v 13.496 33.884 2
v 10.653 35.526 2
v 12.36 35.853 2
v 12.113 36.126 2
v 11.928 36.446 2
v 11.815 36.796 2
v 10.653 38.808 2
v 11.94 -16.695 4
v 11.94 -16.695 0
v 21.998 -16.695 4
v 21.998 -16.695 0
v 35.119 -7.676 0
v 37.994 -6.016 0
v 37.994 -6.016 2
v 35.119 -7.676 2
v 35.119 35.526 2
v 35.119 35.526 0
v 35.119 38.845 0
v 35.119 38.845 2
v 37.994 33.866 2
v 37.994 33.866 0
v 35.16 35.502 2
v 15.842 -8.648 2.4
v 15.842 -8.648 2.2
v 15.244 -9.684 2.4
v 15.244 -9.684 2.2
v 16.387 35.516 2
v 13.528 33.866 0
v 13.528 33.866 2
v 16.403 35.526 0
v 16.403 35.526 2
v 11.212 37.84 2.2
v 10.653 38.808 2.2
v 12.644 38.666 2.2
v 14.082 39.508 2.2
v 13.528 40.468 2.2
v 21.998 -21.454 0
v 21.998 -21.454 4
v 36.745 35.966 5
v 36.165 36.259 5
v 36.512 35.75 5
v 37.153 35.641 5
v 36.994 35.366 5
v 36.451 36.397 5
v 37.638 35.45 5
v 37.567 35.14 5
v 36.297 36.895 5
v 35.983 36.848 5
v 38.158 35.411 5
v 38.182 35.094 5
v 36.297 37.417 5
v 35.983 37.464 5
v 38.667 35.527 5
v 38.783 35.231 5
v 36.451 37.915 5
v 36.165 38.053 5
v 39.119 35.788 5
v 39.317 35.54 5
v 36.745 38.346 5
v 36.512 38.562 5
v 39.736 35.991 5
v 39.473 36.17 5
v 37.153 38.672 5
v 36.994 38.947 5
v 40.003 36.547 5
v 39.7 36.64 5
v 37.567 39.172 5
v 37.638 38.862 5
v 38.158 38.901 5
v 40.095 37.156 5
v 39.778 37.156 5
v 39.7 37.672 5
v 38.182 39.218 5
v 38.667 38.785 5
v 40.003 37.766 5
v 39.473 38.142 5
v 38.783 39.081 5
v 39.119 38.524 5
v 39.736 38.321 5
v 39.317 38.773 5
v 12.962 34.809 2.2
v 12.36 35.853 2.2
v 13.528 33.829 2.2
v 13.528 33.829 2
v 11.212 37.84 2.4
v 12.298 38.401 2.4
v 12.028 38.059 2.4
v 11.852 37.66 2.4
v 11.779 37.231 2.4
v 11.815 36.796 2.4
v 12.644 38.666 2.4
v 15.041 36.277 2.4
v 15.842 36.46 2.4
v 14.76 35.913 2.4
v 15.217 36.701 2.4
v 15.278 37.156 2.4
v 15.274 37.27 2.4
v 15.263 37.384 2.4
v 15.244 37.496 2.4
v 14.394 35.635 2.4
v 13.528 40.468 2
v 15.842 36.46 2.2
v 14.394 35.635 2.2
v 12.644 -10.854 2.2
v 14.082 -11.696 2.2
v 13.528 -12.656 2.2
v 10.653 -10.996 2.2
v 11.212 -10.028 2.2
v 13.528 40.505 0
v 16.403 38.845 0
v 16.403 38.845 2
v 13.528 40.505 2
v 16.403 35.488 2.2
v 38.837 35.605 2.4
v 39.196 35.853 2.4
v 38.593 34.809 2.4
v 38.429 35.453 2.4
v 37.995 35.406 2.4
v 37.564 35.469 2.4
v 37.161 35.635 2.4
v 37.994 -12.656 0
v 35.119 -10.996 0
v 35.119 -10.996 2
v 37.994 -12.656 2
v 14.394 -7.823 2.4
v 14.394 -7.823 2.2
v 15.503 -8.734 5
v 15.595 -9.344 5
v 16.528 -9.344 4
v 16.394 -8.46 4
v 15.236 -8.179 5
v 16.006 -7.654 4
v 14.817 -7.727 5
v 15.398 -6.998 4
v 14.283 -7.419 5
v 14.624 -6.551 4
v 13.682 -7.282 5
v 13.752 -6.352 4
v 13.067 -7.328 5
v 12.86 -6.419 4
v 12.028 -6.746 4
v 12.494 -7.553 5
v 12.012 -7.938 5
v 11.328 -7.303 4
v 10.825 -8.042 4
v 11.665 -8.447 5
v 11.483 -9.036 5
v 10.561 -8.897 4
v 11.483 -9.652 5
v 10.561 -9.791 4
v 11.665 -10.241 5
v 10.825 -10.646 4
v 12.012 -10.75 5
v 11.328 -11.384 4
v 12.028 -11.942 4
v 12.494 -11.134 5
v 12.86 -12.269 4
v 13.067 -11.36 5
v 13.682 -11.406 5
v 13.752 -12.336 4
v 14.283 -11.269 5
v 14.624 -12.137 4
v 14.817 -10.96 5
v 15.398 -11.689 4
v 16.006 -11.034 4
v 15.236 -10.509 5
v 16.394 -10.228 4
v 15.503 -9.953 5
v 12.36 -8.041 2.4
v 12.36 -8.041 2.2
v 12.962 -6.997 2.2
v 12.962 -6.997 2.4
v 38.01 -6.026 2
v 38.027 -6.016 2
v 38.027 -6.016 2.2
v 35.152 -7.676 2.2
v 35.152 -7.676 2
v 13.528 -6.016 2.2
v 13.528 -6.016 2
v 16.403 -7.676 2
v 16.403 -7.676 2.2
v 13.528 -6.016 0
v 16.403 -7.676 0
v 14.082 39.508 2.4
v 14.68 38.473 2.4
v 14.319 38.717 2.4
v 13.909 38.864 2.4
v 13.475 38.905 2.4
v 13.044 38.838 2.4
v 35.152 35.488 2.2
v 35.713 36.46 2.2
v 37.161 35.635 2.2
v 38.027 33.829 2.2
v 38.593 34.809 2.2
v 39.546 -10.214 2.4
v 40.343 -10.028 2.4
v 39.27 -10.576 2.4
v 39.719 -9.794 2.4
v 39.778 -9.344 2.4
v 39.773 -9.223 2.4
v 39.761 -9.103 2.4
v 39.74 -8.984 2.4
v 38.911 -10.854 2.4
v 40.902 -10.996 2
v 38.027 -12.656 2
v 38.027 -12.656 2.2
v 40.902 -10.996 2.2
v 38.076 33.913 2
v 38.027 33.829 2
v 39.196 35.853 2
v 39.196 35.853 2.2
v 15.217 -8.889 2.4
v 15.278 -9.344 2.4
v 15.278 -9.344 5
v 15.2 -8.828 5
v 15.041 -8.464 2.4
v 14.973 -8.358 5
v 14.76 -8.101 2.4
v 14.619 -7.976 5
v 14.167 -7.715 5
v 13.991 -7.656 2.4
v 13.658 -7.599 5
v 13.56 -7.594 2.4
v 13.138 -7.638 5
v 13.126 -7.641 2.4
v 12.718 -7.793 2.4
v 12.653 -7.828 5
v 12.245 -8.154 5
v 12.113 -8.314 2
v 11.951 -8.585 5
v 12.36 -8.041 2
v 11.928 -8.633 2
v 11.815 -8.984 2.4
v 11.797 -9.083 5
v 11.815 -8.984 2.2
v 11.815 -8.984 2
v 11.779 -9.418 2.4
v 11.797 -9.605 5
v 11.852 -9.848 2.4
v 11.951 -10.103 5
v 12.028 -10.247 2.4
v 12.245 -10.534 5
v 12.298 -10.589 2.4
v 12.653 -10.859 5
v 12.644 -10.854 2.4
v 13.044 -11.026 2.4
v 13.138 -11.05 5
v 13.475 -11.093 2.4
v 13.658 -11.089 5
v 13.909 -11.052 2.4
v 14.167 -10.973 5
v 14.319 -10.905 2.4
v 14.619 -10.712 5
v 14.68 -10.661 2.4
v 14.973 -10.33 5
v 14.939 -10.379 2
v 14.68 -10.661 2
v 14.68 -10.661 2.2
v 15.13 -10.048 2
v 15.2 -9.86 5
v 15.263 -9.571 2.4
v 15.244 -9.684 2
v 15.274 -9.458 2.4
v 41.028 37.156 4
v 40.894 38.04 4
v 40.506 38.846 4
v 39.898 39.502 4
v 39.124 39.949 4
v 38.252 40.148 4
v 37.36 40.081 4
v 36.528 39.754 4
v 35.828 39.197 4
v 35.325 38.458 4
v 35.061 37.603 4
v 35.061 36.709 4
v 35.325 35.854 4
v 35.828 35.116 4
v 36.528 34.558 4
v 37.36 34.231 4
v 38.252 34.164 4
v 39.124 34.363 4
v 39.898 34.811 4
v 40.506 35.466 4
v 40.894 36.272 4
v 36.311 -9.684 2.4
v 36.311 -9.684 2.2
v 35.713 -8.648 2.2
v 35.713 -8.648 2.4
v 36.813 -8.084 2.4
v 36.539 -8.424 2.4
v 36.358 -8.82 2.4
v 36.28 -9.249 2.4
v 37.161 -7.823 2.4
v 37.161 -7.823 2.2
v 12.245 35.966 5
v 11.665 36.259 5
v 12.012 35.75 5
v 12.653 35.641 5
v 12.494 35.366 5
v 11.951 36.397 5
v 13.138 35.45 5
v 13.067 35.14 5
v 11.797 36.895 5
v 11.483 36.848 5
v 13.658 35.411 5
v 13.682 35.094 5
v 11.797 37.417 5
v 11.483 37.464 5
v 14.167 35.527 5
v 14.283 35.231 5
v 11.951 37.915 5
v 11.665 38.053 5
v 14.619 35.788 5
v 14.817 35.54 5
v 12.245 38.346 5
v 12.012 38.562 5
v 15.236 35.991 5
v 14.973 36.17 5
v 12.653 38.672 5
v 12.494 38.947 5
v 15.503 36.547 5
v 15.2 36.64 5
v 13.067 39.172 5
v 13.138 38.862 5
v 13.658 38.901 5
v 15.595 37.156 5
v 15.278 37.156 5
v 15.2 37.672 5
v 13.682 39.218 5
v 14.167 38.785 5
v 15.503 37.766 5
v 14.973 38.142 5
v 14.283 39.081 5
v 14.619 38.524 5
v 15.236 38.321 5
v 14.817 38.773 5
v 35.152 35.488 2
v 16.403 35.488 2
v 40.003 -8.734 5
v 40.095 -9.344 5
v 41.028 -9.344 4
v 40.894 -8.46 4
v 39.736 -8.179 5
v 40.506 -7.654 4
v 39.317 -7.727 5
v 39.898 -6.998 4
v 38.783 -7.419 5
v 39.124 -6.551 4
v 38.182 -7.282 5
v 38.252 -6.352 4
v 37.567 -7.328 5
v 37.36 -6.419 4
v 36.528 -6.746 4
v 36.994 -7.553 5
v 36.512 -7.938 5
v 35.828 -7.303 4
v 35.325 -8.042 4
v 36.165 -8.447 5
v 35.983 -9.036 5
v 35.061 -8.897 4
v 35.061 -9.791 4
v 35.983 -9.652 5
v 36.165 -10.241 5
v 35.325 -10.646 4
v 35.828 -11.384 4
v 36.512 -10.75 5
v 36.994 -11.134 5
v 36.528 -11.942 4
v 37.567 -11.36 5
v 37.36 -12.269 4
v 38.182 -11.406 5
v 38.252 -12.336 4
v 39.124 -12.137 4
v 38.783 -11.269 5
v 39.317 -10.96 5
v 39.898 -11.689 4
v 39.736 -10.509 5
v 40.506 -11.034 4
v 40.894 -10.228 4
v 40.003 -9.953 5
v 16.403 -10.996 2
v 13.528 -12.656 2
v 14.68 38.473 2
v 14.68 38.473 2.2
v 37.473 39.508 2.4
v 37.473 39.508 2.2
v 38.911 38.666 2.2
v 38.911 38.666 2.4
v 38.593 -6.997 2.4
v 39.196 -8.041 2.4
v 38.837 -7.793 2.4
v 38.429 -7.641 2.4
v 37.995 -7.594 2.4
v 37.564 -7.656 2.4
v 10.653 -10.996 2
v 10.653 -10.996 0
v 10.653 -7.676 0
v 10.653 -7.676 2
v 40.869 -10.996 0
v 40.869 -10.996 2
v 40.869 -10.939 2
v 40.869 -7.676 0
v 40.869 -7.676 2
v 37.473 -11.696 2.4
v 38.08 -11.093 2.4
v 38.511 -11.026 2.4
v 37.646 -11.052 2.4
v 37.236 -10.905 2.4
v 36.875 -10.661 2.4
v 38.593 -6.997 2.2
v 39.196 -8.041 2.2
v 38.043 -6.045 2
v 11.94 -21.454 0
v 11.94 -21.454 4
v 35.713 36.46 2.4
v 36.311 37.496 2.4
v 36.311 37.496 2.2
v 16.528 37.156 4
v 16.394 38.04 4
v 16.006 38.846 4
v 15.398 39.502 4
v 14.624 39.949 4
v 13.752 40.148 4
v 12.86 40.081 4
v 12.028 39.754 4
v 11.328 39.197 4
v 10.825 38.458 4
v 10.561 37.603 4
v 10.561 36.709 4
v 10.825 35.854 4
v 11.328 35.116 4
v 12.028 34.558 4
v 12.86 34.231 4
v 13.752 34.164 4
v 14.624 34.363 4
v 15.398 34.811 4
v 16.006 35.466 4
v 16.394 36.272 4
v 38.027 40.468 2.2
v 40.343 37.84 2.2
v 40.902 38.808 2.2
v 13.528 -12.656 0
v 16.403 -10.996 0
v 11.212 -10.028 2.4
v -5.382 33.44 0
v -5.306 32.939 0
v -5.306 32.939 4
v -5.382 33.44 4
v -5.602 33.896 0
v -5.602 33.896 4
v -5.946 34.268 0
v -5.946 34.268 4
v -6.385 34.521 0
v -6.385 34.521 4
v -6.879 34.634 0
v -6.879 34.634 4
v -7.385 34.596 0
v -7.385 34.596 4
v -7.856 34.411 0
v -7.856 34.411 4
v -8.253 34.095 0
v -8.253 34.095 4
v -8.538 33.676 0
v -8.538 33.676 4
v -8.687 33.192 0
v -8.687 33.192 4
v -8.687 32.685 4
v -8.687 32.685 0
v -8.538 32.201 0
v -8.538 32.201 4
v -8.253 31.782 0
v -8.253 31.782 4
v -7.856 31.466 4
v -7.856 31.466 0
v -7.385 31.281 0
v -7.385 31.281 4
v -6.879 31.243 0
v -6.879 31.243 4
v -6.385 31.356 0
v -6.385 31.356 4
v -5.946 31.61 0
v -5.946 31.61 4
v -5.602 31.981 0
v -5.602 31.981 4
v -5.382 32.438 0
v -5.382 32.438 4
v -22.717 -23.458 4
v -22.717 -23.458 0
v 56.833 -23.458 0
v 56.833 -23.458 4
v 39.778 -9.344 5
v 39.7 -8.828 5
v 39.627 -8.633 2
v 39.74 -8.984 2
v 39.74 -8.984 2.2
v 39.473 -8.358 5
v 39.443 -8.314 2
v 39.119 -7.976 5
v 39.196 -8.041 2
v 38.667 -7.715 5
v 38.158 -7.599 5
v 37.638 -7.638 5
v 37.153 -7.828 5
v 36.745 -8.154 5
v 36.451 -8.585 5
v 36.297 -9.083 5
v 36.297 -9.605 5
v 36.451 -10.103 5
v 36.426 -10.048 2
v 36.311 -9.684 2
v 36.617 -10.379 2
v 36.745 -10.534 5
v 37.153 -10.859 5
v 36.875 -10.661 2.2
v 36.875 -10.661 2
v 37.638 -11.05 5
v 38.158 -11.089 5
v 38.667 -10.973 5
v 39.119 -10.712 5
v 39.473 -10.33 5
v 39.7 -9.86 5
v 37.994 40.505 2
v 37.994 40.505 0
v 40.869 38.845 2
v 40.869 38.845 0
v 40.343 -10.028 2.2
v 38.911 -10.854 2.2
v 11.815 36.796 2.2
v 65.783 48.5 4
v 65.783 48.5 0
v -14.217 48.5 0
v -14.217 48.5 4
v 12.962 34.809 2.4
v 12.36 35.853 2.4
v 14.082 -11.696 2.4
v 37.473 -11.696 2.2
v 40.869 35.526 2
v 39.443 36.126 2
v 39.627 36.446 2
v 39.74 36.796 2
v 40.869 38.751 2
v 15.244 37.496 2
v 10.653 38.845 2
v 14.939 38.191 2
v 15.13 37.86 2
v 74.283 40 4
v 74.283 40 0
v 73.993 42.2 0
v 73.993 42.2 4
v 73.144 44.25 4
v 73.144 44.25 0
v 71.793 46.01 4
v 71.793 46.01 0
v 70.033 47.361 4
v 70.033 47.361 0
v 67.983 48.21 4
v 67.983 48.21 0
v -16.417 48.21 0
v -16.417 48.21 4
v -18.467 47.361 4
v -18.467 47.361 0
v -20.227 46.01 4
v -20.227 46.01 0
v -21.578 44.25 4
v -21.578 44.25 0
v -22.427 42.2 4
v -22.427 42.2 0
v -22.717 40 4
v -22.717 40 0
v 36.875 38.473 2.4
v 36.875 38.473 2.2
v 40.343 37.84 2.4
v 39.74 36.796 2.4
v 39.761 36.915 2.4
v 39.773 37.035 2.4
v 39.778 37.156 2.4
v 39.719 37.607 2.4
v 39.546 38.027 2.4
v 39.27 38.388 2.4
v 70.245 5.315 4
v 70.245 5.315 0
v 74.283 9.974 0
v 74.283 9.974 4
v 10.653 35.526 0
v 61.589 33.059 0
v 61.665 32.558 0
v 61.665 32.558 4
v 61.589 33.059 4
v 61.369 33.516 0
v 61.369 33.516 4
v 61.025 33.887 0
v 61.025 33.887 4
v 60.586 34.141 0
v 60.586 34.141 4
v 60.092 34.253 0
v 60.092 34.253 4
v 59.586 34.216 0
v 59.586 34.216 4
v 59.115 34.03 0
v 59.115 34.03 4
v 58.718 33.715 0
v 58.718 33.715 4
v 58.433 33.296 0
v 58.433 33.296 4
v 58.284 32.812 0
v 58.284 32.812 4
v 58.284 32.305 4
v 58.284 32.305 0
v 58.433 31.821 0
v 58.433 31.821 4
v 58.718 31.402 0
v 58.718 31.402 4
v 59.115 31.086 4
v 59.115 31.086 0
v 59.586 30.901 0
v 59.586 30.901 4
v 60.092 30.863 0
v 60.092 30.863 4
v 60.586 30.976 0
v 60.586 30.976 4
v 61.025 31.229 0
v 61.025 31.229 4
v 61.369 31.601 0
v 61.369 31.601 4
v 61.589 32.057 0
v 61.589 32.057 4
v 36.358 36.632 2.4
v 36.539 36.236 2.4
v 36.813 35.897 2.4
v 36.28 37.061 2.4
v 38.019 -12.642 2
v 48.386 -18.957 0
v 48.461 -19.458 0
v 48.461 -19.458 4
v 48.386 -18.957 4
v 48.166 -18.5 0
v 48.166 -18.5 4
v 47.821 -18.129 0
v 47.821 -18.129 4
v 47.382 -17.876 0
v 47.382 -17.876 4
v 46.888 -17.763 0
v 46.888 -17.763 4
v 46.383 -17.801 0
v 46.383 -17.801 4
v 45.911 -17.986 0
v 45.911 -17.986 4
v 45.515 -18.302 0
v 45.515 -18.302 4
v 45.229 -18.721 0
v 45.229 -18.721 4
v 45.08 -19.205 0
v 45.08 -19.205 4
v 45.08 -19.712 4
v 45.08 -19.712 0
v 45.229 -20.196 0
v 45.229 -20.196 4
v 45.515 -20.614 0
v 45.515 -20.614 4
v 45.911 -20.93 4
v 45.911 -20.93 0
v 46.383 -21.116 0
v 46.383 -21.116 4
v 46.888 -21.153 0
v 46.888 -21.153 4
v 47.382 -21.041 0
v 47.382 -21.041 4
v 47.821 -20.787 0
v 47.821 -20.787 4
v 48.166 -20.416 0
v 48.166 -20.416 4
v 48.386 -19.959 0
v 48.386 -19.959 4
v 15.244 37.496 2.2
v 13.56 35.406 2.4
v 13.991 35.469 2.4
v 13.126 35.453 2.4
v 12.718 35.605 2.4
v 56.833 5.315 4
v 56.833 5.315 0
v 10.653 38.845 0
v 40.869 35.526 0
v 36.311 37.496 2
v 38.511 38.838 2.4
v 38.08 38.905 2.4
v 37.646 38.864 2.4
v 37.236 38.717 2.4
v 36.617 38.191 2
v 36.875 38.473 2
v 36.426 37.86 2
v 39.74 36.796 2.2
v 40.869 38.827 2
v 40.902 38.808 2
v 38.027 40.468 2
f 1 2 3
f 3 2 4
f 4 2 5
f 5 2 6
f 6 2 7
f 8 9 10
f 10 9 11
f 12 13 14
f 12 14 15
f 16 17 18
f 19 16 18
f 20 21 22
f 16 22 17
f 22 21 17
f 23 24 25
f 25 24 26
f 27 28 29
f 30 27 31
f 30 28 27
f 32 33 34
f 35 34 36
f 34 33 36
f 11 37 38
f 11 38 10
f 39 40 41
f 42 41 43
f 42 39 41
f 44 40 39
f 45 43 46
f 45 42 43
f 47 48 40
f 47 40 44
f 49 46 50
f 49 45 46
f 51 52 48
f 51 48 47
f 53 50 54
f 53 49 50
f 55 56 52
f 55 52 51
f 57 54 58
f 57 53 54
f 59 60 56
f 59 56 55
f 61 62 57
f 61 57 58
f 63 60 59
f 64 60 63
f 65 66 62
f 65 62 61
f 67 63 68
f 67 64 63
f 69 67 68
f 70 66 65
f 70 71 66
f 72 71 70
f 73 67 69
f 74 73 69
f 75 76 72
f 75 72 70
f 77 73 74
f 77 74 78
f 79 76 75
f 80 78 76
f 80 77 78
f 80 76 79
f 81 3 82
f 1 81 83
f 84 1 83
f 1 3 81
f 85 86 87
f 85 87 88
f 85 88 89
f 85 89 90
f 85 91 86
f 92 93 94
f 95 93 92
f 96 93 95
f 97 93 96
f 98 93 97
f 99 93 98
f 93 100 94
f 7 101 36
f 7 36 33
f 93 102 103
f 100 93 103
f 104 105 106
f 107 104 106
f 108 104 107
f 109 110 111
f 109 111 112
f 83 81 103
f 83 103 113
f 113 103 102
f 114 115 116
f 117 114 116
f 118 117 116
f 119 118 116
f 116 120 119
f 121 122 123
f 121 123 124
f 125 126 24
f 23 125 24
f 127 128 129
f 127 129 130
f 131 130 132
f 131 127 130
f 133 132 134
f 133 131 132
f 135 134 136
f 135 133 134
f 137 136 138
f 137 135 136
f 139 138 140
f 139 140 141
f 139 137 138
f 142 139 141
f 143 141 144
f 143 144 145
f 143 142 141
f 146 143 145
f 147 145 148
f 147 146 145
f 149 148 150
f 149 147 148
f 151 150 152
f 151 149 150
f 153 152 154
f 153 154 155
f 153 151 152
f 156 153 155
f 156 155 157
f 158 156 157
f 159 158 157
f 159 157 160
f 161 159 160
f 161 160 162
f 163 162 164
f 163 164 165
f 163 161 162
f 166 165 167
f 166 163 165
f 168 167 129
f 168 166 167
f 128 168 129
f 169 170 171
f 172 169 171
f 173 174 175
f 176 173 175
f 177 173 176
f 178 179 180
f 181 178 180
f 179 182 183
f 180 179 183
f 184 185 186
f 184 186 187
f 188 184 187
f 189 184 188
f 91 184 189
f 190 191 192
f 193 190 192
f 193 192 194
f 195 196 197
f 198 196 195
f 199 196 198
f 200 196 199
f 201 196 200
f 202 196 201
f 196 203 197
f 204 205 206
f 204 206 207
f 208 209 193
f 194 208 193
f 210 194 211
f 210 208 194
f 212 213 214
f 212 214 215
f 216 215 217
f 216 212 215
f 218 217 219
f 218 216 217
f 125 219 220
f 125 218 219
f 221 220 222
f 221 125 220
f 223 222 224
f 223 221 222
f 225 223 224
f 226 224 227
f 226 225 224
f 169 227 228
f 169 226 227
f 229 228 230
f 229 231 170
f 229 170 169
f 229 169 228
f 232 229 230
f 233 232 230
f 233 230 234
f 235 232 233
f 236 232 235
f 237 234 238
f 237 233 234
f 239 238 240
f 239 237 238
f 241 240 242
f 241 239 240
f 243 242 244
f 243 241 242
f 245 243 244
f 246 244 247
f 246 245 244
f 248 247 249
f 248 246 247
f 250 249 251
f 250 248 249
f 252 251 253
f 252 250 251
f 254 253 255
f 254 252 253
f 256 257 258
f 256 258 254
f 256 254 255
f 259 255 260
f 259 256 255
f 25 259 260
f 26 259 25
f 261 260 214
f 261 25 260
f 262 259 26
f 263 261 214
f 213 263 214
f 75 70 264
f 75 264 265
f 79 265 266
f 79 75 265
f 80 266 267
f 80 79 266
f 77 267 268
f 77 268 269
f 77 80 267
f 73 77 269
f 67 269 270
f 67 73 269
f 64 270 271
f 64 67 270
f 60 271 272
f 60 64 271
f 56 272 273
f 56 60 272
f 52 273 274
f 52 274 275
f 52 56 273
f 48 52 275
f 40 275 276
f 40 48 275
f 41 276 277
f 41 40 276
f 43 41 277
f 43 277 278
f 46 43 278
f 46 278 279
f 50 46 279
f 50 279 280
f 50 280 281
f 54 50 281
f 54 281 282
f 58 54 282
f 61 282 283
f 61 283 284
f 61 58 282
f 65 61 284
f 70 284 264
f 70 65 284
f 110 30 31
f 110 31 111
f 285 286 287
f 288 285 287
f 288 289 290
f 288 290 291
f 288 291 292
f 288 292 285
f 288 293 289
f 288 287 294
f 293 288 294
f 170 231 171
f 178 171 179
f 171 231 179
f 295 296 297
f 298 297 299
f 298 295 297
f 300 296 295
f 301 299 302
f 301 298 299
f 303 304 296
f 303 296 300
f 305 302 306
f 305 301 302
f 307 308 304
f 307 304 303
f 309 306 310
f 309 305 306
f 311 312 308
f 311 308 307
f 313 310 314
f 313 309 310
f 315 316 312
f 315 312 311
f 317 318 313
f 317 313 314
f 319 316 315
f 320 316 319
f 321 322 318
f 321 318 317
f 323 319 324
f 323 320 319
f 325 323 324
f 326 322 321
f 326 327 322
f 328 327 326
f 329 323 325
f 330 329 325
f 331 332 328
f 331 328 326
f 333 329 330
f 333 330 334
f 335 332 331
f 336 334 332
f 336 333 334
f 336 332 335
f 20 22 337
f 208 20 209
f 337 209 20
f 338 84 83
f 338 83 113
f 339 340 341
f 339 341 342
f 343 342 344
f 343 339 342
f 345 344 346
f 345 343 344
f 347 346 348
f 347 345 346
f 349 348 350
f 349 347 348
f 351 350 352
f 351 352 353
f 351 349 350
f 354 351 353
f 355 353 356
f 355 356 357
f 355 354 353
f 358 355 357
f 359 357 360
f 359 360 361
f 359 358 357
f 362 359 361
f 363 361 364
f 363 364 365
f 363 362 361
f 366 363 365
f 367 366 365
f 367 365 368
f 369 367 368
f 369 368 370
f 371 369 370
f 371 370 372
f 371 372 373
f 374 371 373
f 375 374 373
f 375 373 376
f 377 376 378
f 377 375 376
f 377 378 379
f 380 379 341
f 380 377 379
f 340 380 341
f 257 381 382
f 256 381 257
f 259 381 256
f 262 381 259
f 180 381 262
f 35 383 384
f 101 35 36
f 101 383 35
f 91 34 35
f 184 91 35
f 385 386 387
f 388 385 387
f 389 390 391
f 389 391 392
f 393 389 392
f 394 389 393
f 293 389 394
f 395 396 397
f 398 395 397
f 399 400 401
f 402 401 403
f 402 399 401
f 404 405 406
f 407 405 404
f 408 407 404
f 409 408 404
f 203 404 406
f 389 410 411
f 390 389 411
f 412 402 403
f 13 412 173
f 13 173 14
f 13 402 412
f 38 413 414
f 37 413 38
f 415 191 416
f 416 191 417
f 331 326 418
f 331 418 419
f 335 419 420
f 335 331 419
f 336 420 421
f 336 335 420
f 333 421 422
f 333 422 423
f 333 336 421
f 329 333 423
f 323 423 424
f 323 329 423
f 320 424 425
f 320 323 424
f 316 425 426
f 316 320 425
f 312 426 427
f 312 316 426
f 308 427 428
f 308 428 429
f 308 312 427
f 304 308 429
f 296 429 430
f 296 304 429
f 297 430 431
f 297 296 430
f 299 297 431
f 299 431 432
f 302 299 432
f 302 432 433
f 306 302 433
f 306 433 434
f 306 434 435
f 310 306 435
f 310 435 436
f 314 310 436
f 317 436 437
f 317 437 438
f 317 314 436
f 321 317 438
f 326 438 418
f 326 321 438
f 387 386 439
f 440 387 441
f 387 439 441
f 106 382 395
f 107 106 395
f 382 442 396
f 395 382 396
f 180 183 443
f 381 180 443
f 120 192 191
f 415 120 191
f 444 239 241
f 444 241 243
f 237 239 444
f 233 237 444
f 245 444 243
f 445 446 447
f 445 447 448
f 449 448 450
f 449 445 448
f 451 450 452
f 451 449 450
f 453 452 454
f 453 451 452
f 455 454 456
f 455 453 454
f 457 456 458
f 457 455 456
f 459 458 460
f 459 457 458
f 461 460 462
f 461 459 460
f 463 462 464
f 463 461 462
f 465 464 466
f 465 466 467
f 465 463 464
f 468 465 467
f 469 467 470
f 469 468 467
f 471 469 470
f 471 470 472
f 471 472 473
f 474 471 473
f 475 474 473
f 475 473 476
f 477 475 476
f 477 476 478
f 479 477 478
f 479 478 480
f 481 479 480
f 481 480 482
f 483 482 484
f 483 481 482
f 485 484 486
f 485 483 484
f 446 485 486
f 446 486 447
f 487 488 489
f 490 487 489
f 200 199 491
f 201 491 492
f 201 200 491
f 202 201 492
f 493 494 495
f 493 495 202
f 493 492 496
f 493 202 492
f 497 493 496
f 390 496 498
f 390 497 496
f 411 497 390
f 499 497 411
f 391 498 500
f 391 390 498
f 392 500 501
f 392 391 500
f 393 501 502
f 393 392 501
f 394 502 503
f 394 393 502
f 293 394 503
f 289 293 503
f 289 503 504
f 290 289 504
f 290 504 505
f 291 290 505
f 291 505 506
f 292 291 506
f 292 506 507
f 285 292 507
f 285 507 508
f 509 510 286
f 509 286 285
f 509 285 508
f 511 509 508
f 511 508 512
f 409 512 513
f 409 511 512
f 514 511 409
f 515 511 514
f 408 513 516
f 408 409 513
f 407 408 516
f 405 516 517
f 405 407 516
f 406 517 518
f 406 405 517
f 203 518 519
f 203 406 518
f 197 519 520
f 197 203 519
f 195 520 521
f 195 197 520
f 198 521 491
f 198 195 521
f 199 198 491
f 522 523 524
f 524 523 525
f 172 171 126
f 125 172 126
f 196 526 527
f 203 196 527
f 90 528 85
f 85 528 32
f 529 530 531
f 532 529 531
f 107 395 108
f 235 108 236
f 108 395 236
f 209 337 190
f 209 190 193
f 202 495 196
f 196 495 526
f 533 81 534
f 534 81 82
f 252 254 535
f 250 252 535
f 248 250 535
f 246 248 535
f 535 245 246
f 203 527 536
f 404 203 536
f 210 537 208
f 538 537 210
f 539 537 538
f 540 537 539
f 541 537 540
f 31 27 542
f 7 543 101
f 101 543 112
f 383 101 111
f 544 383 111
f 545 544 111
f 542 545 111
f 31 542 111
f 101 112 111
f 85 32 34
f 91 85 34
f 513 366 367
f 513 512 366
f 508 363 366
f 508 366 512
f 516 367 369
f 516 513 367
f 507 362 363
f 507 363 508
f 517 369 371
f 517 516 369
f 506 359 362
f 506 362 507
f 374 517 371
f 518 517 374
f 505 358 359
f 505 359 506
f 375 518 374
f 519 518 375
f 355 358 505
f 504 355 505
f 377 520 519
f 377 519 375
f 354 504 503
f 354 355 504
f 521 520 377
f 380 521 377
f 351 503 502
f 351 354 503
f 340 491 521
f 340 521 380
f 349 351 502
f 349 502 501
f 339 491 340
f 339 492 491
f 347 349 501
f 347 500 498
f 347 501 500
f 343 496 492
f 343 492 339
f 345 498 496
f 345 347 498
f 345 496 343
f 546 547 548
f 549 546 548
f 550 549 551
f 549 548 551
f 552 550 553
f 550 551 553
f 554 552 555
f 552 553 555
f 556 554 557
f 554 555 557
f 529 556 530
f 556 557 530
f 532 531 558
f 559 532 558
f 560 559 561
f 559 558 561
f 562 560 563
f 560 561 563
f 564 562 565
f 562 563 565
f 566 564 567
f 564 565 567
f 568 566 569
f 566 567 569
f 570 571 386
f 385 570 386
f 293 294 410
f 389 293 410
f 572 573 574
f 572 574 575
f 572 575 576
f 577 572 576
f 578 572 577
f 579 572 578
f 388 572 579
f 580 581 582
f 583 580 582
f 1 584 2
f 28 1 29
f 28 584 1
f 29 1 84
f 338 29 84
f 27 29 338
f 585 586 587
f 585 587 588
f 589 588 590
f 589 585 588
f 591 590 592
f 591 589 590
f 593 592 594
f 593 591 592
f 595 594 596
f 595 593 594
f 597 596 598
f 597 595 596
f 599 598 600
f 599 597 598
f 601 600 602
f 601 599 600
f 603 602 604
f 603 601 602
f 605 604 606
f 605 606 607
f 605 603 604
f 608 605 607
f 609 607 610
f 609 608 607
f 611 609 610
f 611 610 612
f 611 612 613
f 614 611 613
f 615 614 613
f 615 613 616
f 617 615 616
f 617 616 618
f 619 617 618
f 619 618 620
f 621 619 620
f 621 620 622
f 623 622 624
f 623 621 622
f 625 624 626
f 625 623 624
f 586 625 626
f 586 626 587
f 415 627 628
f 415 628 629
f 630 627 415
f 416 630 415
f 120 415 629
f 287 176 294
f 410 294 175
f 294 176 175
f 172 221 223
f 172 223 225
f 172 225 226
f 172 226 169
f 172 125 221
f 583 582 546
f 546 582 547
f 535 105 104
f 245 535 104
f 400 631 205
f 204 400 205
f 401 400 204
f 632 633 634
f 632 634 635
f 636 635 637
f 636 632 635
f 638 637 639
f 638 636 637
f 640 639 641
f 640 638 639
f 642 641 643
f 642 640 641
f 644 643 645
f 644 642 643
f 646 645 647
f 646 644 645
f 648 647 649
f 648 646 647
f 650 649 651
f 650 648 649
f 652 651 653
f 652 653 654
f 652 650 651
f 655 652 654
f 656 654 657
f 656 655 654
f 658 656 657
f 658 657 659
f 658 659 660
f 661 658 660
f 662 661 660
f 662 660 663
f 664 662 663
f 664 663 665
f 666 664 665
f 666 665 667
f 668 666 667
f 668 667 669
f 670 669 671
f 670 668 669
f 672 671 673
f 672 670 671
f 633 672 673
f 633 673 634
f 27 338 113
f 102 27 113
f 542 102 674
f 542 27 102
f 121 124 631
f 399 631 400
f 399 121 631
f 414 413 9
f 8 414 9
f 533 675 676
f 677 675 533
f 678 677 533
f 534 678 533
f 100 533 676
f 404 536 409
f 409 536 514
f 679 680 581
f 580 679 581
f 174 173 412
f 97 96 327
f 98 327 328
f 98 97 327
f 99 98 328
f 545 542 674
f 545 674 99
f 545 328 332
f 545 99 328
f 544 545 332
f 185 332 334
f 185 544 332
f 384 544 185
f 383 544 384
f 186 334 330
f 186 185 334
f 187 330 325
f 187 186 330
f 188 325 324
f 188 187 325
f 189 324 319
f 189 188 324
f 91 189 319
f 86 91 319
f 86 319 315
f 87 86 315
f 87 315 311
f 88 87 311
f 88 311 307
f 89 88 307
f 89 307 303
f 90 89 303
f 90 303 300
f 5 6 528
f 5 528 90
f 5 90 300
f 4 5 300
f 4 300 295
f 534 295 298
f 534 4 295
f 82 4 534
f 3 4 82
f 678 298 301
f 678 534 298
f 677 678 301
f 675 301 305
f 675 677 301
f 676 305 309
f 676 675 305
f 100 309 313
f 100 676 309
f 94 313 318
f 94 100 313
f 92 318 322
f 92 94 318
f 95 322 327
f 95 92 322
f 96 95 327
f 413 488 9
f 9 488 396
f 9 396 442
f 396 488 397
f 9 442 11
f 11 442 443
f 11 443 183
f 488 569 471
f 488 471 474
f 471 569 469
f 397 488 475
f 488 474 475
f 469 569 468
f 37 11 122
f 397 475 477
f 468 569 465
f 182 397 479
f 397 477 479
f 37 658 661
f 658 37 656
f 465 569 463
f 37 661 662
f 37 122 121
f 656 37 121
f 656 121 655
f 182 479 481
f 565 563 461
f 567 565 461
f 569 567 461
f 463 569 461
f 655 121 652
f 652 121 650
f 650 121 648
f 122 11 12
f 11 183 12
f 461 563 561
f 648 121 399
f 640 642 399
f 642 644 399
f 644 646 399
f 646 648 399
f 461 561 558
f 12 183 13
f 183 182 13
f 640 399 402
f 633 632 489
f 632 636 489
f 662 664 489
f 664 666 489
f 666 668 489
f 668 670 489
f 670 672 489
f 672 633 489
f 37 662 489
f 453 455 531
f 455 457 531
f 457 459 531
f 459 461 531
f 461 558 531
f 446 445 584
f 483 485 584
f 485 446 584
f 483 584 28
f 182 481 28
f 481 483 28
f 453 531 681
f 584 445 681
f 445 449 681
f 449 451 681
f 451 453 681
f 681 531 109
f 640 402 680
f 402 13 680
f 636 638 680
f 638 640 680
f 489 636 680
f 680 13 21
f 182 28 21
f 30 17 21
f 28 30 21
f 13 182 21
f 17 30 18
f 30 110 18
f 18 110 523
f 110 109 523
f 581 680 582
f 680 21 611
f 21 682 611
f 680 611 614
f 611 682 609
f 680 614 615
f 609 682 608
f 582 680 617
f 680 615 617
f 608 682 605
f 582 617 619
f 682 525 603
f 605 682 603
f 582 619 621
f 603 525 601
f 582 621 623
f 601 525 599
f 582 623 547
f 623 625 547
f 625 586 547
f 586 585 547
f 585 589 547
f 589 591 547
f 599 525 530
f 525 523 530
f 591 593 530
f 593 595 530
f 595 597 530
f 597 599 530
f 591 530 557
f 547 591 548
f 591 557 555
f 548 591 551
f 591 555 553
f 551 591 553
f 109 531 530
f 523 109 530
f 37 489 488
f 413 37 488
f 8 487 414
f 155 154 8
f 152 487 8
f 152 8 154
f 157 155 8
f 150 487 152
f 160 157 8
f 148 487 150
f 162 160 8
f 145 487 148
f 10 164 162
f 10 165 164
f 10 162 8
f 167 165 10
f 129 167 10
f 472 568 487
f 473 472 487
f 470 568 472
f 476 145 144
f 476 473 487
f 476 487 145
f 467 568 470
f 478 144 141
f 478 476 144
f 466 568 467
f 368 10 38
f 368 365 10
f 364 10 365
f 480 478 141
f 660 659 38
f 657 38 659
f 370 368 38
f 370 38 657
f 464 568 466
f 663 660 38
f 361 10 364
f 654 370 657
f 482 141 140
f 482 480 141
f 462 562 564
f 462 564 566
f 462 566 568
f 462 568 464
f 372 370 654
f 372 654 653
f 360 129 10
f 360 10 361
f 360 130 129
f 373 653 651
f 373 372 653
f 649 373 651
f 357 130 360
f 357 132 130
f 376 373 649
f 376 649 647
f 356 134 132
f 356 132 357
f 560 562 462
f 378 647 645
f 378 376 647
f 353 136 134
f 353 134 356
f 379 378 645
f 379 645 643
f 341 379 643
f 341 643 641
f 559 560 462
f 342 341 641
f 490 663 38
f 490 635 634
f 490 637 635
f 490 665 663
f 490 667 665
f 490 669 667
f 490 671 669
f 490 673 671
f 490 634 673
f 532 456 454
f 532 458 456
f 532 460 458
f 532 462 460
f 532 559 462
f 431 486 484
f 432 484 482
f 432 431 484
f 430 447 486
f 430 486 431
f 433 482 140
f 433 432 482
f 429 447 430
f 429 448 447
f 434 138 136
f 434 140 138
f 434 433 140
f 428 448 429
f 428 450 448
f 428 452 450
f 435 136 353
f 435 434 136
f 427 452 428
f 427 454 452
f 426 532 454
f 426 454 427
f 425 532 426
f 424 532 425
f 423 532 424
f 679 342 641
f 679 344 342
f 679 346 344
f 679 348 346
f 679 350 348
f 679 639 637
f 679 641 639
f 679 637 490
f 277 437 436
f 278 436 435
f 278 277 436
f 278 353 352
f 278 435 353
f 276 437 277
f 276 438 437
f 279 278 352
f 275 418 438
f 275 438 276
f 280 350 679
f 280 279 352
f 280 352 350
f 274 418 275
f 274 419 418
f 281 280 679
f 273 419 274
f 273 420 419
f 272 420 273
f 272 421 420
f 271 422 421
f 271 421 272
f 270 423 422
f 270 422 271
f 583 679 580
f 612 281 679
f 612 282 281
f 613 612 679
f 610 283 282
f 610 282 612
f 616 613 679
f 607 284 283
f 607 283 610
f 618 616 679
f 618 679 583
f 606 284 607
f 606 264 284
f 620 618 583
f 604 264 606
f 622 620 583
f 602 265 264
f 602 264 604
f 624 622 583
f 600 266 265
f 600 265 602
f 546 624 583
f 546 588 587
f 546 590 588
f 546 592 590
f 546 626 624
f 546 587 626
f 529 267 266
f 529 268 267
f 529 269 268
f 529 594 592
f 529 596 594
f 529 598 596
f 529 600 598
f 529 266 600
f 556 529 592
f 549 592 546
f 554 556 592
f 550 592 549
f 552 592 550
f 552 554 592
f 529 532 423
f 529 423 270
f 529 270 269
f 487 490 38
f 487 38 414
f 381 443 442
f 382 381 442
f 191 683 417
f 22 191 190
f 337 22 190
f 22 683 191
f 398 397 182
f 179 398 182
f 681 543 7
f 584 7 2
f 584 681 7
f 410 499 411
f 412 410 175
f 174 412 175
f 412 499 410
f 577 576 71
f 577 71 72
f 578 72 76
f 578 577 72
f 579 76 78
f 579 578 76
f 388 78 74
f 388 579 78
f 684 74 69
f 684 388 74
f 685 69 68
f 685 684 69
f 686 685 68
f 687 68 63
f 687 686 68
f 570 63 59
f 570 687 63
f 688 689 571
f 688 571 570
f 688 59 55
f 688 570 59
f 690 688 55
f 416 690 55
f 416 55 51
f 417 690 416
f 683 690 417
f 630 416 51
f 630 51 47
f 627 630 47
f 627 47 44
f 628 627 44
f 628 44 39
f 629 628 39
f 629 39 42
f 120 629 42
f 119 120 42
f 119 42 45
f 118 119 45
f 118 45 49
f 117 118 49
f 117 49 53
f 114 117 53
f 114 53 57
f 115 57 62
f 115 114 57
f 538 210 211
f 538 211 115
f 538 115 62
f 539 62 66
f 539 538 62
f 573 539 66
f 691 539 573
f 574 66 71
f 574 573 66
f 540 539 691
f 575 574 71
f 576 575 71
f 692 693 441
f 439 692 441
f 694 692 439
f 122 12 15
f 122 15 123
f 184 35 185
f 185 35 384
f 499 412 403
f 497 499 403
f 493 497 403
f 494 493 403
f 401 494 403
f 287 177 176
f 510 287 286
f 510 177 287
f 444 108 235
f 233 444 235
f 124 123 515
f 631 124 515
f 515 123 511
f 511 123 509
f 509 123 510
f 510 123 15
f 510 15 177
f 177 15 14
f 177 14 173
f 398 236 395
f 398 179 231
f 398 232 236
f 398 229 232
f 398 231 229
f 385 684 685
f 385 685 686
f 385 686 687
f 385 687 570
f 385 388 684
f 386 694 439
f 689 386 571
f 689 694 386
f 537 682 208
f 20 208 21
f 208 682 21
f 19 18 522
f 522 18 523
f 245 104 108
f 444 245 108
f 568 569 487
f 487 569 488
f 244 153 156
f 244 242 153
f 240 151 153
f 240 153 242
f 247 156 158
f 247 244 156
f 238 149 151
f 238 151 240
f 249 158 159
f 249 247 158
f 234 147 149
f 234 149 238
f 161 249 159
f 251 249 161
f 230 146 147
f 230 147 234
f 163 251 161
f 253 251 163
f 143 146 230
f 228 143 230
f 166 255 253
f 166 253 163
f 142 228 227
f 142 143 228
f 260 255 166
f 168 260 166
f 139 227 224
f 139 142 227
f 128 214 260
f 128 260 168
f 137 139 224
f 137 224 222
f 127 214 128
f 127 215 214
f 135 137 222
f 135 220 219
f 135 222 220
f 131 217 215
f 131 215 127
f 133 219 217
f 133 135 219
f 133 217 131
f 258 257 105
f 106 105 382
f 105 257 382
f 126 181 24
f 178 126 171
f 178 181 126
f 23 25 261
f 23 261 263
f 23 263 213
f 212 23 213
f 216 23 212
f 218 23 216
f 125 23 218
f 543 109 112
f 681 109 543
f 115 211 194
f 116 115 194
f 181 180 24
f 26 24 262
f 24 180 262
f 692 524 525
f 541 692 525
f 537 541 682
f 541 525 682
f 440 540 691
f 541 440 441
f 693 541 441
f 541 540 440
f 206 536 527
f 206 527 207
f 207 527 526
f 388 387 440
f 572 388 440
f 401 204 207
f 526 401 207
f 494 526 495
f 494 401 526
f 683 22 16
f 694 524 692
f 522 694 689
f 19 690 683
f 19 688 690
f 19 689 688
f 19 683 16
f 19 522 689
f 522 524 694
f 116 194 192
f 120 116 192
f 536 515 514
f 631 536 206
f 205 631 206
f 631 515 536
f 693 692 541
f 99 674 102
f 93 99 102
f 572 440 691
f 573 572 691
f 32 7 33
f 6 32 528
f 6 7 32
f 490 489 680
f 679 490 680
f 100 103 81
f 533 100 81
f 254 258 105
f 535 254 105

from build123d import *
from OCP.BRepFilletAPI import BRepFilletAPI_MakeChamfer

# Parameters (mm, degrees)
CROQUIS1_R              = 1.7
CROQUIS1_W              = 10.058265445
CROQUIS1_H              = 4.759112173
SALIENTE_EXTRUIR1_DEPTH = 4
CROQUIS2_R              = 3
CROQUIS2_R_2            = 1.75
SALIENTE_EXTRUIR2_DEPTH = 1
CHAFL_N1_SIZE           = 1
CHAFL_N1_SIZE_2         = 0.932515086
CORTAR_EXTRUIR1_START   = -6
CROQUIS3_R              = 1.75
CORTAR_EXTRUIR1_DEPTH   = 6
CORTAR_EXTRUIR2_DEPTH   = 2
CORTAR_EXTRUIR3_DEPTH   = 0.2
CORTAR_EXTRUIR4_DEPTH   = 0.2


with BuildPart() as part:
    # Croquis1 → Saliente-Extruir1 (new body)
    with BuildSketch(Plane.XY):
        with BuildLine():
            Line((46.761077919, -23.458131852), (56.832754836, -23.458131852))
            Line((56.832754836, -23.458131852), (56.832754836, 5.314653818))
            Line((56.832754836, 5.314653818), (70.245248308, 5.314653818))
            Line((70.245248308, 5.314653818), (74.283027827, 9.974351882))
            Line((74.283027827, 9.974351882), (74.283027827, 40))
            ThreePointArc((74.283027827, 40), (71.793435467, 46.01040764), (65.783027827, 48.5))
            Line((65.783027827, 48.5), (-14.216972173, 48.5))
            ThreePointArc((-14.216972173, 48.5), (-20.227379813, 46.01040764), (-22.716972173, 40))
            Line((-22.716972173, 40), (-22.716972173, -23.458131852))
            Line((-22.716972173, -23.458131852), (46.761077919, -23.458131852))
        make_face()
        with Locations((46.761077919, -19.458131852)):
            Circle(CROQUIS1_R, mode=Mode.SUBTRACT)
        with Locations((-7.00634082, 32.938725209)):
            Circle(CROQUIS1_R, mode=Mode.SUBTRACT)
        with Locations((59.964675143, 32.558212342)):
            Circle(CROQUIS1_R, mode=Mode.SUBTRACT)
        with Locations((16.969290087, -19.074136319)):
            Rectangle(CROQUIS1_W, CROQUIS1_H, mode=Mode.SUBTRACT)
    extrude(amount=SALIENTE_EXTRUIR1_DEPTH)

    # Croquis2 → Saliente-Extruir2 (add)
    # profile 1 of 4: a face of its own
    with BuildSketch(Plane.XY.offset(4)):
        with Locations((13.527577906, 37.15608476)):
            Circle(CROQUIS2_R)
        with Locations((13.527577906, 37.15608476)):
            Circle(CROQUIS2_R_2, mode=Mode.SUBTRACT)
    # profile 2 of 4: a face of its own
    with BuildSketch(Plane.XY.offset(4)):
        with Locations((38.027577906, 37.15608476)):
            Circle(CROQUIS2_R)
        with Locations((38.027577906, 37.15608476)):
            Circle(CROQUIS2_R_2, mode=Mode.SUBTRACT)
    # profile 3 of 4: a face of its own
    with BuildSketch(Plane.XY.offset(4)):
        with Locations((38.027577906, -9.34391524)):
            Circle(CROQUIS2_R)
        with Locations((38.027577906, -9.34391524)):
            Circle(CROQUIS2_R_2, mode=Mode.SUBTRACT)
    # profile 4 of 4: a face of its own
    with BuildSketch(Plane.XY.offset(4)):
        with Locations((13.527577906, -9.34391524)):
            Circle(CROQUIS2_R)
        with Locations((13.527577906, -9.34391524)):
            Circle(CROQUIS2_R_2, mode=Mode.SUBTRACT)
    extrude(amount=SALIENTE_EXTRUIR2_DEPTH)

    # Chaflán1
    chafl_n1_edges_1 = [part.edges().sort_by_distance(p)[0] for p in [
        (10.527577906, 37.15608476, 5),
    ]]
    chafl_n1_side_1 = [part.faces().sort_by_distance(p)[0] for p in [
        (10.527577906, 37.15608476, 4.981349698),
    ]]
    chafl_n1_edges_2 = [part.edges().sort_by_distance(p)[0] for p in [
        (35.027577906, 37.15608476, 5),
    ]]
    chafl_n1_side_2 = [part.faces().sort_by_distance(p)[0] for p in [
        (35.027577906, 37.15608476, 4.981349698),
    ]]
    chafl_n1_edges_3 = [part.edges().sort_by_distance(p)[0] for p in [
        (35.027577906, -9.34391524, 5),
    ]]
    chafl_n1_side_3 = [part.faces().sort_by_distance(p)[0] for p in [
        (35.027577906, -9.34391524, 4.981349698),
    ]]
    chafl_n1_edges_4 = [part.edges().sort_by_distance(p)[0] for p in [
        (10.527577906, -9.34391524, 5),
    ]]
    chafl_n1_side_4 = [part.faces().sort_by_distance(p)[0] for p in [
        (10.527577906, -9.34391524, 4.981349698),
    ]]
    chafl_n1 = BRepFilletAPI_MakeChamfer(part.part.solid().wrapped)
    for e in chafl_n1_edges_1:
        chafl_n1.Add(CHAFL_N1_SIZE - 0.0001, CHAFL_N1_SIZE_2 - 0.0001, e.wrapped, chafl_n1_side_1[0].wrapped)
    for e in chafl_n1_edges_2:
        chafl_n1.Add(CHAFL_N1_SIZE - 0.0001, CHAFL_N1_SIZE_2 - 0.0001, e.wrapped, chafl_n1_side_2[0].wrapped)
    for e in chafl_n1_edges_3:
        chafl_n1.Add(CHAFL_N1_SIZE - 0.0001, CHAFL_N1_SIZE_2 - 0.0001, e.wrapped, chafl_n1_side_3[0].wrapped)
    for e in chafl_n1_edges_4:
        chafl_n1.Add(CHAFL_N1_SIZE - 0.0001, CHAFL_N1_SIZE_2 - 0.0001, e.wrapped, chafl_n1_side_4[0].wrapped)
    add(Compound.cast(chafl_n1.Shape()), mode=Mode.REPLACE)  # a hair under: the kernel refuses the full size

    # Croquis3 → Cortar-Extruir1 (cut)
    with BuildSketch(Plane.XY.offset(4).offset(CORTAR_EXTRUIR1_START)):
        with Locations((13.527577906, -9.34391524)):
            Circle(CROQUIS3_R)
        with Locations((38.027577906, -9.34391524)):
            Circle(CROQUIS3_R)
        with Locations((38.027577906, 37.15608476)):
            Circle(CROQUIS3_R)
        with Locations((13.527577906, 37.15608476)):
            Circle(CROQUIS3_R)
    extrude(amount=CORTAR_EXTRUIR1_DEPTH, mode=Mode.SUBTRACT)

    # Croquis5 → Cortar-Extruir2 (cut)
    with BuildSketch(Plane(origin=(0, 0, 0), x_dir=(-1, 0, 0), z_dir=(0, 0, -1))):
        Polygon((-13.528313647, -12.655938197), (-10.653313647, -10.996056173), (-10.653313647, -7.676292125), (-13.528313647, -6.016410101), (-16.403313647, -7.676292125), (-16.403313647, -10.996056173), align=None)
        Polygon((-40.868755289, -7.676292125), (-37.993755289, -6.016410101), (-35.118755289, -7.676292125), (-35.118755289, -10.996056173), (-37.993755289, -12.655938197), (-40.868755289, -10.996056173), align=None)
        Polygon((-40.868755289, 38.845431555), (-40.868755289, 35.525667507), (-37.993755289, 33.865785483), (-35.118755289, 35.525667507), (-35.118755289, 38.845431555), (-37.993755289, 40.505313579), align=None)
        Polygon((-16.403313647, 35.525667507), (-16.403313647, 38.845431555), (-13.528313647, 40.505313579), (-10.653313647, 38.845431555), (-10.653313647, 35.525667507), (-13.528313647, 33.865785483), align=None)
    extrude(amount=-CORTAR_EXTRUIR2_DEPTH, mode=Mode.SUBTRACT)

    # Croquis6 → Cortar-Extruir3 (cut)
    with BuildSketch(Plane(origin=(0, 0, 2), x_dir=(-1, 0, 0), z_dir=(0, 0, -1))):
        with BuildLine():
            Line((-14.680313514, -10.660615896), (-13.528313647, -12.655938197))
            Line((-13.528313647, -12.655938197), (-10.653313647, -10.996056173))
            Line((-10.653313647, -10.996056173), (-11.814996998, -8.983961587))
            ThreePointArc((-11.814996998, -8.983961587), (-11.786957817, -9.162968548), (-11.777577906, -9.34391524))
            ThreePointArc((-11.777577906, -9.34391524), (-12.804662736, -10.937619622), (-14.680313514, -10.660615896))
        make_face()
        with BuildLine():
            Line((-16.403313647, -7.676292125), (-15.244241928, -9.683863233))
            ThreePointArc((-15.244241928, -9.683863233), (-14.393721726, -7.823292051), (-12.359558444, -8.040753494))
            Line((-12.359558444, -8.040753494), (-13.528313647, -6.016410101))
            Line((-13.528313647, -6.016410101), (-16.403313647, -7.676292125))
        make_face()
        Polygon((-38.026842165, 33.828579621), (-40.901842165, 38.808225692), (-38.026842165, 40.468107716), (-35.151842165, 35.488461645), align=None)
        Polygon((-13.528313647, 40.468107716), (-10.653313647, 38.808225692), (-13.528313647, 33.828579621), (-16.403313647, 35.488461645), align=None)
        Polygon((-38.026842165, -12.655938197), (-40.901842165, -10.996056173), (-38.026842165, -6.016410101), (-35.151842165, -7.676292125), align=None)
    extrude(amount=-CORTAR_EXTRUIR3_DEPTH, mode=Mode.SUBTRACT)

    # Croquis7 → Cortar-Extruir4 (cut)
    with BuildSketch(Plane(origin=(0, 0, 2.2), x_dir=(-1, 0, 0), z_dir=(0, 0, -1))):
        with BuildLine():
            ThreePointArc((-15.244241928, -9.683863233), (-15.11916685, -8.616354498), (-14.393721726, -7.823292051))
            Line((-14.393721726, -7.823292051), (-15.842124921, -8.648299511))
            Line((-15.842124921, -8.648299511), (-15.244241928, -9.683863233))
        make_face()
        with BuildLine():
            Line((-12.962262832, -6.996838873), (-14.393721726, -7.823292051))
            ThreePointArc((-14.393721726, -7.823292051), (-13.341554801, -7.603830356), (-12.359558444, -8.040753494))
            Line((-12.359558444, -8.040753494), (-12.962262832, -6.996838873))
        make_face()
        with BuildLine():
            ThreePointArc((-11.814996998, -8.983961587), (-11.927608639, -10.052856947), (-12.643751504, -10.854329386))
            Line((-12.643751504, -10.854329386), (-11.21229261, -10.027876208))
            Line((-11.21229261, -10.027876208), (-11.814996998, -8.983961587))
        make_face()
        with BuildLine():
            Line((-14.082430521, -11.696179618), (-12.643751504, -10.854329386))
            ThreePointArc((-12.643751504, -10.854329386), (-13.693286293, -11.086052069), (-14.680313514, -10.660615896))
            Line((-14.680313514, -10.660615896), (-14.082430521, -11.696179618))
        make_face()
        with BuildLine():
            ThreePointArc((-39.195597368, -8.040753494), (-38.213601012, -7.603830356), (-37.161434087, -7.823292051))
            Line((-37.161434087, -7.823292051), (-38.592892981, -6.996838873))
            Line((-38.592892981, -6.996838873), (-39.195597368, -8.040753494))
        make_face()
        with BuildLine():
            Line((-36.310913885, -9.683863233), (-35.713030891, -8.648299511))
            Line((-35.713030891, -8.648299511), (-37.161434087, -7.823292051))
            ThreePointArc((-37.161434087, -7.823292051), (-36.435988962, -8.616354498), (-36.310913885, -9.683863233))
        make_face()
        with BuildLine():
            Line((-37.472725291, -11.696179618), (-36.874842298, -10.660615896))
            ThreePointArc((-36.874842298, -10.660615896), (-37.86186952, -11.086052069), (-38.911404308, -10.854329386))
            Line((-38.911404308, -10.854329386), (-37.472725291, -11.696179618))
        make_face()
        with BuildLine():
            Line((-40.342863202, -10.027876208), (-38.911404308, -10.854329386))
            ThreePointArc((-38.911404308, -10.854329386), (-39.627547173, -10.052856947), (-39.740158814, -8.983961587))
            Line((-39.740158814, -8.983961587), (-40.342863202, -10.027876208))
        make_face()
        with BuildLine():
            ThreePointArc((-39.740158814, 36.796131106), (-39.627547173, 37.865026467), (-38.911404308, 38.666498906))
            Line((-38.911404308, 38.666498906), (-40.342863202, 37.840045728))
            Line((-40.342863202, 37.840045728), (-39.740158814, 36.796131106))
        make_face()
        with BuildLine():
            ThreePointArc((-38.911404308, 38.666498906), (-37.86186952, 38.898221589), (-36.874842298, 38.472785416))
            Line((-36.874842298, 38.472785416), (-37.472725291, 39.508349137))
            Line((-37.472725291, 39.508349137), (-38.911404308, 38.666498906))
        make_face()
        with BuildLine():
            ThreePointArc((-36.310913885, 37.496032752), (-36.435988962, 36.428524018), (-37.161434087, 35.635461571))
            Line((-37.161434087, 35.635461571), (-35.713030891, 36.460469031))
            Line((-35.713030891, 36.460469031), (-36.310913885, 37.496032752))
        make_face()
        with BuildLine():
            ThreePointArc((-37.161434087, 35.635461571), (-38.213601012, 35.415999876), (-39.195597368, 35.852923014))
            Line((-39.195597368, 35.852923014), (-38.592892981, 34.809008393))
            Line((-38.592892981, 34.809008393), (-37.161434087, 35.635461571))
        make_face()
        with BuildLine():
            Line((-11.814996998, 36.796131106), (-11.21229261, 37.840045728))
            Line((-11.21229261, 37.840045728), (-12.643751504, 38.666498906))
            ThreePointArc((-12.643751504, 38.666498906), (-11.927608639, 37.865026467), (-11.814996998, 36.796131106))
        make_face()
        with BuildLine():
            ThreePointArc((-14.680313514, 38.472785416), (-13.693286293, 38.898221589), (-12.643751504, 38.666498906))
            Line((-12.643751504, 38.666498906), (-14.082430521, 39.508349137))
            Line((-14.082430521, 39.508349137), (-14.680313514, 38.472785416))
        make_face()
        with BuildLine():
            Line((-15.842124921, 36.460469031), (-14.393721726, 35.635461571))
            ThreePointArc((-14.393721726, 35.635461571), (-15.11916685, 36.428524018), (-15.244241928, 37.496032752))
            Line((-15.244241928, 37.496032752), (-15.842124921, 36.460469031))
        make_face()
        with BuildLine():
            Line((-12.962262832, 34.809008393), (-12.359558444, 35.852923014))
            ThreePointArc((-12.359558444, 35.852923014), (-13.341554801, 35.415999876), (-14.393721726, 35.635461571))
            Line((-14.393721726, 35.635461571), (-12.962262832, 34.809008393))
        make_face()
    extrude(amount=-CORTAR_EXTRUIR4_DEPTH, mode=Mode.SUBTRACT)


solid = part.part
